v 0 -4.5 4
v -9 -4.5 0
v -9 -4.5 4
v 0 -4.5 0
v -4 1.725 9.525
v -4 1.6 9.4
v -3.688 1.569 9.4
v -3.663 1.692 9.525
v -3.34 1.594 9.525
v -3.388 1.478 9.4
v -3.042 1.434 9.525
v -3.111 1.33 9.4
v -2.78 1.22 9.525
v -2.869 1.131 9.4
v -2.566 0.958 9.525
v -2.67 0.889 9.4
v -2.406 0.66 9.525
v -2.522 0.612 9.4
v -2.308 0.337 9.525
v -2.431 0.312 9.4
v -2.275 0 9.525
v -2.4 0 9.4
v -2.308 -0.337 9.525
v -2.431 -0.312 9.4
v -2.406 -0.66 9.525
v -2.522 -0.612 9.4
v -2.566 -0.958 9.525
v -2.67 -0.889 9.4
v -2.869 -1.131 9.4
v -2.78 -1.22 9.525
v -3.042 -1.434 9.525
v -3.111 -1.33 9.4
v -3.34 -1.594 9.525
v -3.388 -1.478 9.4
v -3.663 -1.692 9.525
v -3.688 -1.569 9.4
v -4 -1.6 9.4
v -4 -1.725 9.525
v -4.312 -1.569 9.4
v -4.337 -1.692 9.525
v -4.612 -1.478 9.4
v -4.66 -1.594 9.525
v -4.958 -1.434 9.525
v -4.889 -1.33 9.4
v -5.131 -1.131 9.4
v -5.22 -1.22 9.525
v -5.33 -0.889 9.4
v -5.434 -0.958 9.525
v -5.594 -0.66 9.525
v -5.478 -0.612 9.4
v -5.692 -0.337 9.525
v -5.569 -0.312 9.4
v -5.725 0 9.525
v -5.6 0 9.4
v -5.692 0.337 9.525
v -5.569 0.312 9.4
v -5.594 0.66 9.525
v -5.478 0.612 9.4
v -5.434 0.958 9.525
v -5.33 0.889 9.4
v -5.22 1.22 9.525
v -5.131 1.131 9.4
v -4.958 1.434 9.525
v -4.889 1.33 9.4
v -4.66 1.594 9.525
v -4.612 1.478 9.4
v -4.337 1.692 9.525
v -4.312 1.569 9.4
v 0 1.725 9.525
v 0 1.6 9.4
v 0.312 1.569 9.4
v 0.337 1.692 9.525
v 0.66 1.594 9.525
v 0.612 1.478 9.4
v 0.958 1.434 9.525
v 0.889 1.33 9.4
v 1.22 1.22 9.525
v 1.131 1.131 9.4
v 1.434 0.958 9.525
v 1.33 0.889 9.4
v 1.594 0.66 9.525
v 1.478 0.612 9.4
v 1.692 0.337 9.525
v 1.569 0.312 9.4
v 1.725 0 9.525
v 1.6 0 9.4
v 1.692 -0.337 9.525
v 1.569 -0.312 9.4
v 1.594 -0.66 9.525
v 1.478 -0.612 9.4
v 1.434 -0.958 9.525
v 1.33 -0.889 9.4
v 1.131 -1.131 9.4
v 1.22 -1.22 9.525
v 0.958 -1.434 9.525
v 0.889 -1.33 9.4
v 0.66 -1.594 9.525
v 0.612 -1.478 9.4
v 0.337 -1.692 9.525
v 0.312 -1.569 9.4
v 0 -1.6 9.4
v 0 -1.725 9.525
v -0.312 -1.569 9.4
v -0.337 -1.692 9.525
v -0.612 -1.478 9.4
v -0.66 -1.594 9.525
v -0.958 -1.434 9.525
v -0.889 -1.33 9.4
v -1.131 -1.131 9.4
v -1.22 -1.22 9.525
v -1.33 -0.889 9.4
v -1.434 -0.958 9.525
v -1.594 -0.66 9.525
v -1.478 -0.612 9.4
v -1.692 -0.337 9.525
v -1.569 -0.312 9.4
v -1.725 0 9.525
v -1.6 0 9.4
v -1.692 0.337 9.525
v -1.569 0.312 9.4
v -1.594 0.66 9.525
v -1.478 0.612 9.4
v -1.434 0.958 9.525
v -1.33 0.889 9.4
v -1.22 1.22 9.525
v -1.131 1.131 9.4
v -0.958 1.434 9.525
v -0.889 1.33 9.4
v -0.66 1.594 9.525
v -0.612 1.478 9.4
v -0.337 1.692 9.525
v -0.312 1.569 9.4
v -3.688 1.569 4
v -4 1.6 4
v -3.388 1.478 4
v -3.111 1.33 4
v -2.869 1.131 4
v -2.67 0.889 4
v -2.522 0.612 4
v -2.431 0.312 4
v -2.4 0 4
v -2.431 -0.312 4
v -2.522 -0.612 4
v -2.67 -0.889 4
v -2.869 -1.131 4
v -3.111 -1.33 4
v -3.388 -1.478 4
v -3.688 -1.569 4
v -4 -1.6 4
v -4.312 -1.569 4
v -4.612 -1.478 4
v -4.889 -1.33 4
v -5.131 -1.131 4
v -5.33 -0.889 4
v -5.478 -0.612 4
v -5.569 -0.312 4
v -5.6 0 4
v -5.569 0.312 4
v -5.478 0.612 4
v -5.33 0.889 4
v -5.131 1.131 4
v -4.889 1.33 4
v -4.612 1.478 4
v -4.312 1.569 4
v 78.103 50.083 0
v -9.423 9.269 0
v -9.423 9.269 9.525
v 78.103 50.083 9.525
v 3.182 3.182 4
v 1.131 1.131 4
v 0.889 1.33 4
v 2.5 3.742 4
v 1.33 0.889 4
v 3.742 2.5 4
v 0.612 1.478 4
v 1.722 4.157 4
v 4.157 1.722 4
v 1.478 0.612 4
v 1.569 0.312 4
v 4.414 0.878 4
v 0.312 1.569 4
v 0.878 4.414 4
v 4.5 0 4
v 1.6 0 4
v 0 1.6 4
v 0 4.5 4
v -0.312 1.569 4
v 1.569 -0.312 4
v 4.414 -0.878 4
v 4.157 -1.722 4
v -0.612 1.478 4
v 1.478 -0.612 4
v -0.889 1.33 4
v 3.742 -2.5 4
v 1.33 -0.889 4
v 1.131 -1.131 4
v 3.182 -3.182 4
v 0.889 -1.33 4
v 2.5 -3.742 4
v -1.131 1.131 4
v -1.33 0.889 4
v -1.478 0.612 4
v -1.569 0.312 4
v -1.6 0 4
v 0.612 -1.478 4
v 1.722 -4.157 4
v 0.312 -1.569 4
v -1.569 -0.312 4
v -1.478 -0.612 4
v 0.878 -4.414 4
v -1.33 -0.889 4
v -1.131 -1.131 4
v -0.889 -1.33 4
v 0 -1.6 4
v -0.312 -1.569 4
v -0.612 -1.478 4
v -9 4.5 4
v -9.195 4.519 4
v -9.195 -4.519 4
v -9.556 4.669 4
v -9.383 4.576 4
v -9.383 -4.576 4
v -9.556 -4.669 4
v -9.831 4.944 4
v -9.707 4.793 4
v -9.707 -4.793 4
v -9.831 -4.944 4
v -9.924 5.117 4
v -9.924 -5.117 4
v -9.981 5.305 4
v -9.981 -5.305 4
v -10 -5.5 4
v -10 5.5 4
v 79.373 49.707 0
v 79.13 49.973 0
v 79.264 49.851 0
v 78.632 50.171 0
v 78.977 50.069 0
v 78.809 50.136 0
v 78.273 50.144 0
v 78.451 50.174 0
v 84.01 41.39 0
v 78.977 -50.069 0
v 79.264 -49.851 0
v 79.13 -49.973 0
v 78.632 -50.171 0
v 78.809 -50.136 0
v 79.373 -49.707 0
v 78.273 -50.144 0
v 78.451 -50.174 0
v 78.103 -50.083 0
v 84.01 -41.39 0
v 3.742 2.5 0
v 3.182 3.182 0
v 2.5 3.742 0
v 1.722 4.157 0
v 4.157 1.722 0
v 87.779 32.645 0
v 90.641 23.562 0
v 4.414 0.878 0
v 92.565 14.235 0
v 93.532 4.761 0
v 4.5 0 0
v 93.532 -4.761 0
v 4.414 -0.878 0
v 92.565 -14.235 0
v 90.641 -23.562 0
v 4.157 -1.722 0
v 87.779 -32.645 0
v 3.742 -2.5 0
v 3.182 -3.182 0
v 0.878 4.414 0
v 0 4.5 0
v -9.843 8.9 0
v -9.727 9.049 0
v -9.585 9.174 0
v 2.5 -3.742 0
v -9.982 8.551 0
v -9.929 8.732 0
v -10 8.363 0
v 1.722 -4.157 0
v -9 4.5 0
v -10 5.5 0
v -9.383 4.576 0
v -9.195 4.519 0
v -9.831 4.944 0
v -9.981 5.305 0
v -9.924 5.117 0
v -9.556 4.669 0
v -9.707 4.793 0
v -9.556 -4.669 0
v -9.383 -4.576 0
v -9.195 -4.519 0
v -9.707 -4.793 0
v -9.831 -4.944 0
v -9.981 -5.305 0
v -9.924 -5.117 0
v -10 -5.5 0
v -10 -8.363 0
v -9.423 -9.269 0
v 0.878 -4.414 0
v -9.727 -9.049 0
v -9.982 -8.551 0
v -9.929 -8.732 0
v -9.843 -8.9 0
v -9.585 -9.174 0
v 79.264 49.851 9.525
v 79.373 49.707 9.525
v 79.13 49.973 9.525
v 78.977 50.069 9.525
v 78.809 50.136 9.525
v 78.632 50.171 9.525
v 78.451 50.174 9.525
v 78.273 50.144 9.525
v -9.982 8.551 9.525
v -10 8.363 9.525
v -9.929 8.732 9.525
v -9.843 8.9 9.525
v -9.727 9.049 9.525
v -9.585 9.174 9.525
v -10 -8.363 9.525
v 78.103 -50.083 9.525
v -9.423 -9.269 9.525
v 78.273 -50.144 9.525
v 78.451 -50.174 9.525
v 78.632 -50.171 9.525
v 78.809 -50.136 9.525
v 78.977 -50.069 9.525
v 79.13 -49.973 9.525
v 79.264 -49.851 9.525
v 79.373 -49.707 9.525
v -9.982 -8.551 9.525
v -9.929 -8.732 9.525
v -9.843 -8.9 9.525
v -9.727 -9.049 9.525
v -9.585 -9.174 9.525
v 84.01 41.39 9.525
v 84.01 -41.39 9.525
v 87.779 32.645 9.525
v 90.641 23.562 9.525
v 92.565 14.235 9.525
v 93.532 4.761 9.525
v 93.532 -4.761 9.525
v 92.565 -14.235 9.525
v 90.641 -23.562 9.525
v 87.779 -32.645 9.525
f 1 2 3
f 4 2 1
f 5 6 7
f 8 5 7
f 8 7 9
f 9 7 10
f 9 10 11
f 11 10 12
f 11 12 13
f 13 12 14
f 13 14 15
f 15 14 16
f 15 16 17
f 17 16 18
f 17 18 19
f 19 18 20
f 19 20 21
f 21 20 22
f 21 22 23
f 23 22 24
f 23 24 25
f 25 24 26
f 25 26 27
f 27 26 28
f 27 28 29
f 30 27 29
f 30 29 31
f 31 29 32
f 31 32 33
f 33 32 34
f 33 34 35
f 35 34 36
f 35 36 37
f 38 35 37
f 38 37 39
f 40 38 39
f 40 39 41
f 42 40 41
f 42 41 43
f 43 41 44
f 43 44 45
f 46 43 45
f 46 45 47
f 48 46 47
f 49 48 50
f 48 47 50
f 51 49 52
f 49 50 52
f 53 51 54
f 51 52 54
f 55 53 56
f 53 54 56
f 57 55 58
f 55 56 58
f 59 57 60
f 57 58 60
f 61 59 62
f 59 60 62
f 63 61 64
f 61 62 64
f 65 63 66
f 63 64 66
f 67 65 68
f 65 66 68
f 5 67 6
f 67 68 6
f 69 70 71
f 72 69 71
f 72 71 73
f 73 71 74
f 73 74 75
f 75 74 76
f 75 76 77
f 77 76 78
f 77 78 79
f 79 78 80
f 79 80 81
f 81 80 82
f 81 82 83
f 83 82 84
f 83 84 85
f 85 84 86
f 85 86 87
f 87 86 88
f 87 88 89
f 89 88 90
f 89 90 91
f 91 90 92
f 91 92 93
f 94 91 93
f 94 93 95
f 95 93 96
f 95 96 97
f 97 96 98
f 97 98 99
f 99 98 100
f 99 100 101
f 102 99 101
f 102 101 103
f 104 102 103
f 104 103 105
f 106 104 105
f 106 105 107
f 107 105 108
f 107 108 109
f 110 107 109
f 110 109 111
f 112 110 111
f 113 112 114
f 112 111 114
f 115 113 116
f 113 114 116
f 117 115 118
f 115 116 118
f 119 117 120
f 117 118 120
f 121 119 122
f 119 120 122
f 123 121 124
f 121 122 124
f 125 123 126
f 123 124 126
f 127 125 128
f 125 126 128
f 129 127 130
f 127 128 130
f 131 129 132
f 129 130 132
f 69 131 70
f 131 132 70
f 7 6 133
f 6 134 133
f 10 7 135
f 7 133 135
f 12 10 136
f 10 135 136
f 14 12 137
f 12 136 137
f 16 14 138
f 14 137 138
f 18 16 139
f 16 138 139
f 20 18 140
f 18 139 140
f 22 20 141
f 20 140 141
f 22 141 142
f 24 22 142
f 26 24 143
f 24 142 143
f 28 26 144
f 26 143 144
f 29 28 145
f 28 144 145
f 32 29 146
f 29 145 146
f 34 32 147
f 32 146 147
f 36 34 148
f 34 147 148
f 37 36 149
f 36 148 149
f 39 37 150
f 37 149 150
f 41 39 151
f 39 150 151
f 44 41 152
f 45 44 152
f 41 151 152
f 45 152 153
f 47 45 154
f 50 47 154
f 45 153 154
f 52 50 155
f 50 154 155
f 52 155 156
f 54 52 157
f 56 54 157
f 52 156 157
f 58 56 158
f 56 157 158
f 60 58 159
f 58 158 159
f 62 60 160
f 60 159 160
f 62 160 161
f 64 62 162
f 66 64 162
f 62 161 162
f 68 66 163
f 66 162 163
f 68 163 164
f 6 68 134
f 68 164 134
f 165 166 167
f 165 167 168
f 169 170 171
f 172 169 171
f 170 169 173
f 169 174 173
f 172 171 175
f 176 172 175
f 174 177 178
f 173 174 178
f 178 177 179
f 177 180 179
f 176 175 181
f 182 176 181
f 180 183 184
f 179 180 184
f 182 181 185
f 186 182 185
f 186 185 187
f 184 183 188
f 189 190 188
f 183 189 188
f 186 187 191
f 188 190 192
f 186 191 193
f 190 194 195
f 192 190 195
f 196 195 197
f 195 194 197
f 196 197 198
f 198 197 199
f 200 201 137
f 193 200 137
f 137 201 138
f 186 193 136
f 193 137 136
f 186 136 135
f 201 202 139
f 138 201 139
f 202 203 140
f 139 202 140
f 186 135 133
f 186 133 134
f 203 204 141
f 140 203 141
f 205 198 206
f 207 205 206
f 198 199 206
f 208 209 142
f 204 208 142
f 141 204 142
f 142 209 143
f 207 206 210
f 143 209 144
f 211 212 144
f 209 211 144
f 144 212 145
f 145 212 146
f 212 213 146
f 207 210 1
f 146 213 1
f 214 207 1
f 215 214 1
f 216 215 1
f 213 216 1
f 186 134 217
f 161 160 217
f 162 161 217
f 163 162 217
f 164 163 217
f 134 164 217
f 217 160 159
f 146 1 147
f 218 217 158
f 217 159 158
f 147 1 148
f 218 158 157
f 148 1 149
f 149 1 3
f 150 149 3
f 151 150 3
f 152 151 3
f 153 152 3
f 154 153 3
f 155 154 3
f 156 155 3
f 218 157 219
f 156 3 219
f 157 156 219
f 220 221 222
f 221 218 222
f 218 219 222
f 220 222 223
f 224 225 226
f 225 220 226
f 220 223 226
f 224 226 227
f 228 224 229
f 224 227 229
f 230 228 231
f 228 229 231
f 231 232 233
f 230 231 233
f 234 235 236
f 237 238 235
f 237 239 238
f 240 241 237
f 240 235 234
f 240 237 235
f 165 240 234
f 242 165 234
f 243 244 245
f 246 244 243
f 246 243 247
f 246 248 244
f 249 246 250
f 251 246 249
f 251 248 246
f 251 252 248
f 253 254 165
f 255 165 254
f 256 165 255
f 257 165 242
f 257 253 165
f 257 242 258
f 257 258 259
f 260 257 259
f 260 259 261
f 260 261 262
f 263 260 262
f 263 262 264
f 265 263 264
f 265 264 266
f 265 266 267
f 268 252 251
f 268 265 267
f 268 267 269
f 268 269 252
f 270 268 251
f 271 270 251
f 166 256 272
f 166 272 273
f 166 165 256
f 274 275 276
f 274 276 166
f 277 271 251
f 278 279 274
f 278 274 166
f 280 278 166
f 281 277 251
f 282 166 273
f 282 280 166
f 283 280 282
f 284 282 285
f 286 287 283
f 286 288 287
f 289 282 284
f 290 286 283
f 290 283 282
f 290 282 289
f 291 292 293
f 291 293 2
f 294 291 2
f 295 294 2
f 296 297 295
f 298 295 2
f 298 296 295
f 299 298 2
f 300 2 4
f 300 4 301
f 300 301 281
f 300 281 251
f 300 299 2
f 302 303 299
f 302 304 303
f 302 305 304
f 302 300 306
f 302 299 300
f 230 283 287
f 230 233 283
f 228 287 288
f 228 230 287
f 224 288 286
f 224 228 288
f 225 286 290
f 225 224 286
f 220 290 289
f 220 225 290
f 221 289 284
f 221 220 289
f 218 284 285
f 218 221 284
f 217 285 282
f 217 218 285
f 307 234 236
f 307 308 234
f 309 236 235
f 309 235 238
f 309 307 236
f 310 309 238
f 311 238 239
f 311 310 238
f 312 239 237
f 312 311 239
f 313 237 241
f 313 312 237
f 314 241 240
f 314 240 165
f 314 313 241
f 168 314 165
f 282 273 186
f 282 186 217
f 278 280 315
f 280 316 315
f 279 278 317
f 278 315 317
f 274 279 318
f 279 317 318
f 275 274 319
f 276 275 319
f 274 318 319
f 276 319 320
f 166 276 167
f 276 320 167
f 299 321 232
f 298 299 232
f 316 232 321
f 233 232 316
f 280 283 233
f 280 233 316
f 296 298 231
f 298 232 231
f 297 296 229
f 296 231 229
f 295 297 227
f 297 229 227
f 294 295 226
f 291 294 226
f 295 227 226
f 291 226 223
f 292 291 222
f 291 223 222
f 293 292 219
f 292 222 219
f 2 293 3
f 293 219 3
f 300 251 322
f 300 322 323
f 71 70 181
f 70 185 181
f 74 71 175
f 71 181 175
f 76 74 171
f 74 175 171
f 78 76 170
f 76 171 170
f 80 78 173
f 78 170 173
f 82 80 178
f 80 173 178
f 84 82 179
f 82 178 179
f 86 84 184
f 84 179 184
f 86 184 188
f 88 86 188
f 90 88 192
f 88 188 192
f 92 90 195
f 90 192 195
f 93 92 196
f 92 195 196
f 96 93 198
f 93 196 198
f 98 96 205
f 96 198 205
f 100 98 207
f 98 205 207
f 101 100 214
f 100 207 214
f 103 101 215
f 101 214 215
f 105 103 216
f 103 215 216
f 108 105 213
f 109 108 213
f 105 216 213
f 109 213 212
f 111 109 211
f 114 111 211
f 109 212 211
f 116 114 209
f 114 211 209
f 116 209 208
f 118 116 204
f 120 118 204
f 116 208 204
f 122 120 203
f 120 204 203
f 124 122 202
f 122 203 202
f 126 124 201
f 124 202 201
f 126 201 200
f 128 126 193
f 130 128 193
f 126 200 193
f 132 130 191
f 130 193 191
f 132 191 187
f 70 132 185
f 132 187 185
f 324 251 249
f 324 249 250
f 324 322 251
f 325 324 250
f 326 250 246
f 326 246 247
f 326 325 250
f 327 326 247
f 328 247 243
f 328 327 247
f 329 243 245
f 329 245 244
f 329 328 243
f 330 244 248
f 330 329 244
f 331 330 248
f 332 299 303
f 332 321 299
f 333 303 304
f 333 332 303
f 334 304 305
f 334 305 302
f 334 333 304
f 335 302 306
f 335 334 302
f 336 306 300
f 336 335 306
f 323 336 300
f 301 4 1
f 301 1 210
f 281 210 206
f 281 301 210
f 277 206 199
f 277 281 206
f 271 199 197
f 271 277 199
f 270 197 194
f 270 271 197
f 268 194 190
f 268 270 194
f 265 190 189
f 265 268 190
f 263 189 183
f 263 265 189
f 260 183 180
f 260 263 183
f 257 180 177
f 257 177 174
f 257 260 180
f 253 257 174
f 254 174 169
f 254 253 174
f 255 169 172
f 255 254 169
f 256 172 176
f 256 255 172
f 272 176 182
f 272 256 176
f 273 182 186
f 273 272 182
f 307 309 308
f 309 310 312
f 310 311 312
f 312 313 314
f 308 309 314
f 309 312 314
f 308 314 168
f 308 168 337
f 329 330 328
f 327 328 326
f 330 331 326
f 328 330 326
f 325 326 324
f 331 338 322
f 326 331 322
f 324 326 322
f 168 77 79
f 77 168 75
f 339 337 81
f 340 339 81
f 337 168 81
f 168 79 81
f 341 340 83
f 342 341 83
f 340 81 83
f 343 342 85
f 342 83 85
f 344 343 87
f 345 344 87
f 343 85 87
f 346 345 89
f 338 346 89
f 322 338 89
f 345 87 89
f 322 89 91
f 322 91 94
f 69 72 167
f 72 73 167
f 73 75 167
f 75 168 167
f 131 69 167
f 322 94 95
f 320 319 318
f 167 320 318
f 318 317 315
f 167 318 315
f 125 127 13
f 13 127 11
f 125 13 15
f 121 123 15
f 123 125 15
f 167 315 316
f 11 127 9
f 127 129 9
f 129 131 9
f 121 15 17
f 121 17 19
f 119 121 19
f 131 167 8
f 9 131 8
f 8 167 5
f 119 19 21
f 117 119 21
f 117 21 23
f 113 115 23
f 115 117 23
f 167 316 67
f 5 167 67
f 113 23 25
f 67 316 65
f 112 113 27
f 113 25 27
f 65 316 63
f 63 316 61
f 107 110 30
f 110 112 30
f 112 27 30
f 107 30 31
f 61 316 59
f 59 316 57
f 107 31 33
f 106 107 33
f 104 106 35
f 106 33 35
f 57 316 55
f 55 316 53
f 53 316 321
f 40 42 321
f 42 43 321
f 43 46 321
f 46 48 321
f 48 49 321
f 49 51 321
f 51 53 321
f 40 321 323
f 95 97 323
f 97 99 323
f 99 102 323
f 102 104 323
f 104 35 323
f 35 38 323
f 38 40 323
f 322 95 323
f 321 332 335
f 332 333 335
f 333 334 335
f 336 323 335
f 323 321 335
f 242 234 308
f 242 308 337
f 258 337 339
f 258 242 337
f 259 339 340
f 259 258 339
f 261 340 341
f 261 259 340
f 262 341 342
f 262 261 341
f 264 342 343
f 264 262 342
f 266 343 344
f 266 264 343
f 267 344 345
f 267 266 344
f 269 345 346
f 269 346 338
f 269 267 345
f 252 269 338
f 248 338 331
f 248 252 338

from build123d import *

# Parameters (mm, degrees)
BOSS_EXTRUDE1_DEPTH            = 9.525
CUT_EXTRUDE2_DEPTH             = 4
M3_CLEARANCE_HOLE1_D           = 3.2
M3_CLEARANCE_HOLE1_CSINK_D     = 3.45
M3_CLEARANCE_HOLE1_CSINK_ANGLE = 90
FILLET1_R                      = 1


with BuildPart() as part:
    # Sketch2 → Boss-Extrude1 (new body)
    with BuildSketch(Plane(origin=(0, 0, 0), x_dir=(0, 1, 0), z_dir=(0, 0, 1))):
        with BuildLine():
            Line((-9, 10), (9, 10))
            Line((9, 10), (50.45475081, -78.9))
            ThreePointArc((50.45475081, -78.9), (0, -93.653039883), (-50.45475081, -78.9))
            Line((-50.45475081, -78.9), (-9, 10))
        make_face()
    extrude(amount=BOSS_EXTRUDE1_DEPTH)

    # Sketch3 → Cut-Extrude2 (cut)
    with BuildSketch(Plane(origin=(0, 0, 0), x_dir=(1, 0, 0), z_dir=(0, 0, -1))):
        with BuildLine():
            Line((-10, -4.5), (-10, 4.5))
            Line((-10, 4.5), (0, 4.5))
            ThreePointArc((0, 4.5), (4.5, 0), (0, -4.5))
            Line((0, -4.5), (-10, -4.5))
        make_face()
    extrude(amount=-CUT_EXTRUDE2_DEPTH, mode=Mode.SUBTRACT)

    # M3 Clearance Hole1 (through all)
    with Locations(Plane(origin=(0, 0, 9.525), x_dir=(0, -1, 0), z_dir=(0, 0, 1))):
        with Locations((0, 0), (0, -4)):
            CounterSinkHole(M3_CLEARANCE_HOLE1_D / 2, M3_CLEARANCE_HOLE1_CSINK_D / 2, counter_sink_angle=M3_CLEARANCE_HOLE1_CSINK_ANGLE)

    # Fillet1
    fillet1_edges = [part.edges().sort_by_distance(p)[0] for p in [
        (-10, 4.5, 2),
        (-10, -4.5, 2),
        (-10, -9, 4.7625),
        (-10, 9, 4.7625),
        (78.9, 50.45475081, 4.7625),
        (78.9, -50.45475081, 4.7625),
    ]]
    fillet(fillet1_edges, radius=FILLET1_R)


solid = part.part
